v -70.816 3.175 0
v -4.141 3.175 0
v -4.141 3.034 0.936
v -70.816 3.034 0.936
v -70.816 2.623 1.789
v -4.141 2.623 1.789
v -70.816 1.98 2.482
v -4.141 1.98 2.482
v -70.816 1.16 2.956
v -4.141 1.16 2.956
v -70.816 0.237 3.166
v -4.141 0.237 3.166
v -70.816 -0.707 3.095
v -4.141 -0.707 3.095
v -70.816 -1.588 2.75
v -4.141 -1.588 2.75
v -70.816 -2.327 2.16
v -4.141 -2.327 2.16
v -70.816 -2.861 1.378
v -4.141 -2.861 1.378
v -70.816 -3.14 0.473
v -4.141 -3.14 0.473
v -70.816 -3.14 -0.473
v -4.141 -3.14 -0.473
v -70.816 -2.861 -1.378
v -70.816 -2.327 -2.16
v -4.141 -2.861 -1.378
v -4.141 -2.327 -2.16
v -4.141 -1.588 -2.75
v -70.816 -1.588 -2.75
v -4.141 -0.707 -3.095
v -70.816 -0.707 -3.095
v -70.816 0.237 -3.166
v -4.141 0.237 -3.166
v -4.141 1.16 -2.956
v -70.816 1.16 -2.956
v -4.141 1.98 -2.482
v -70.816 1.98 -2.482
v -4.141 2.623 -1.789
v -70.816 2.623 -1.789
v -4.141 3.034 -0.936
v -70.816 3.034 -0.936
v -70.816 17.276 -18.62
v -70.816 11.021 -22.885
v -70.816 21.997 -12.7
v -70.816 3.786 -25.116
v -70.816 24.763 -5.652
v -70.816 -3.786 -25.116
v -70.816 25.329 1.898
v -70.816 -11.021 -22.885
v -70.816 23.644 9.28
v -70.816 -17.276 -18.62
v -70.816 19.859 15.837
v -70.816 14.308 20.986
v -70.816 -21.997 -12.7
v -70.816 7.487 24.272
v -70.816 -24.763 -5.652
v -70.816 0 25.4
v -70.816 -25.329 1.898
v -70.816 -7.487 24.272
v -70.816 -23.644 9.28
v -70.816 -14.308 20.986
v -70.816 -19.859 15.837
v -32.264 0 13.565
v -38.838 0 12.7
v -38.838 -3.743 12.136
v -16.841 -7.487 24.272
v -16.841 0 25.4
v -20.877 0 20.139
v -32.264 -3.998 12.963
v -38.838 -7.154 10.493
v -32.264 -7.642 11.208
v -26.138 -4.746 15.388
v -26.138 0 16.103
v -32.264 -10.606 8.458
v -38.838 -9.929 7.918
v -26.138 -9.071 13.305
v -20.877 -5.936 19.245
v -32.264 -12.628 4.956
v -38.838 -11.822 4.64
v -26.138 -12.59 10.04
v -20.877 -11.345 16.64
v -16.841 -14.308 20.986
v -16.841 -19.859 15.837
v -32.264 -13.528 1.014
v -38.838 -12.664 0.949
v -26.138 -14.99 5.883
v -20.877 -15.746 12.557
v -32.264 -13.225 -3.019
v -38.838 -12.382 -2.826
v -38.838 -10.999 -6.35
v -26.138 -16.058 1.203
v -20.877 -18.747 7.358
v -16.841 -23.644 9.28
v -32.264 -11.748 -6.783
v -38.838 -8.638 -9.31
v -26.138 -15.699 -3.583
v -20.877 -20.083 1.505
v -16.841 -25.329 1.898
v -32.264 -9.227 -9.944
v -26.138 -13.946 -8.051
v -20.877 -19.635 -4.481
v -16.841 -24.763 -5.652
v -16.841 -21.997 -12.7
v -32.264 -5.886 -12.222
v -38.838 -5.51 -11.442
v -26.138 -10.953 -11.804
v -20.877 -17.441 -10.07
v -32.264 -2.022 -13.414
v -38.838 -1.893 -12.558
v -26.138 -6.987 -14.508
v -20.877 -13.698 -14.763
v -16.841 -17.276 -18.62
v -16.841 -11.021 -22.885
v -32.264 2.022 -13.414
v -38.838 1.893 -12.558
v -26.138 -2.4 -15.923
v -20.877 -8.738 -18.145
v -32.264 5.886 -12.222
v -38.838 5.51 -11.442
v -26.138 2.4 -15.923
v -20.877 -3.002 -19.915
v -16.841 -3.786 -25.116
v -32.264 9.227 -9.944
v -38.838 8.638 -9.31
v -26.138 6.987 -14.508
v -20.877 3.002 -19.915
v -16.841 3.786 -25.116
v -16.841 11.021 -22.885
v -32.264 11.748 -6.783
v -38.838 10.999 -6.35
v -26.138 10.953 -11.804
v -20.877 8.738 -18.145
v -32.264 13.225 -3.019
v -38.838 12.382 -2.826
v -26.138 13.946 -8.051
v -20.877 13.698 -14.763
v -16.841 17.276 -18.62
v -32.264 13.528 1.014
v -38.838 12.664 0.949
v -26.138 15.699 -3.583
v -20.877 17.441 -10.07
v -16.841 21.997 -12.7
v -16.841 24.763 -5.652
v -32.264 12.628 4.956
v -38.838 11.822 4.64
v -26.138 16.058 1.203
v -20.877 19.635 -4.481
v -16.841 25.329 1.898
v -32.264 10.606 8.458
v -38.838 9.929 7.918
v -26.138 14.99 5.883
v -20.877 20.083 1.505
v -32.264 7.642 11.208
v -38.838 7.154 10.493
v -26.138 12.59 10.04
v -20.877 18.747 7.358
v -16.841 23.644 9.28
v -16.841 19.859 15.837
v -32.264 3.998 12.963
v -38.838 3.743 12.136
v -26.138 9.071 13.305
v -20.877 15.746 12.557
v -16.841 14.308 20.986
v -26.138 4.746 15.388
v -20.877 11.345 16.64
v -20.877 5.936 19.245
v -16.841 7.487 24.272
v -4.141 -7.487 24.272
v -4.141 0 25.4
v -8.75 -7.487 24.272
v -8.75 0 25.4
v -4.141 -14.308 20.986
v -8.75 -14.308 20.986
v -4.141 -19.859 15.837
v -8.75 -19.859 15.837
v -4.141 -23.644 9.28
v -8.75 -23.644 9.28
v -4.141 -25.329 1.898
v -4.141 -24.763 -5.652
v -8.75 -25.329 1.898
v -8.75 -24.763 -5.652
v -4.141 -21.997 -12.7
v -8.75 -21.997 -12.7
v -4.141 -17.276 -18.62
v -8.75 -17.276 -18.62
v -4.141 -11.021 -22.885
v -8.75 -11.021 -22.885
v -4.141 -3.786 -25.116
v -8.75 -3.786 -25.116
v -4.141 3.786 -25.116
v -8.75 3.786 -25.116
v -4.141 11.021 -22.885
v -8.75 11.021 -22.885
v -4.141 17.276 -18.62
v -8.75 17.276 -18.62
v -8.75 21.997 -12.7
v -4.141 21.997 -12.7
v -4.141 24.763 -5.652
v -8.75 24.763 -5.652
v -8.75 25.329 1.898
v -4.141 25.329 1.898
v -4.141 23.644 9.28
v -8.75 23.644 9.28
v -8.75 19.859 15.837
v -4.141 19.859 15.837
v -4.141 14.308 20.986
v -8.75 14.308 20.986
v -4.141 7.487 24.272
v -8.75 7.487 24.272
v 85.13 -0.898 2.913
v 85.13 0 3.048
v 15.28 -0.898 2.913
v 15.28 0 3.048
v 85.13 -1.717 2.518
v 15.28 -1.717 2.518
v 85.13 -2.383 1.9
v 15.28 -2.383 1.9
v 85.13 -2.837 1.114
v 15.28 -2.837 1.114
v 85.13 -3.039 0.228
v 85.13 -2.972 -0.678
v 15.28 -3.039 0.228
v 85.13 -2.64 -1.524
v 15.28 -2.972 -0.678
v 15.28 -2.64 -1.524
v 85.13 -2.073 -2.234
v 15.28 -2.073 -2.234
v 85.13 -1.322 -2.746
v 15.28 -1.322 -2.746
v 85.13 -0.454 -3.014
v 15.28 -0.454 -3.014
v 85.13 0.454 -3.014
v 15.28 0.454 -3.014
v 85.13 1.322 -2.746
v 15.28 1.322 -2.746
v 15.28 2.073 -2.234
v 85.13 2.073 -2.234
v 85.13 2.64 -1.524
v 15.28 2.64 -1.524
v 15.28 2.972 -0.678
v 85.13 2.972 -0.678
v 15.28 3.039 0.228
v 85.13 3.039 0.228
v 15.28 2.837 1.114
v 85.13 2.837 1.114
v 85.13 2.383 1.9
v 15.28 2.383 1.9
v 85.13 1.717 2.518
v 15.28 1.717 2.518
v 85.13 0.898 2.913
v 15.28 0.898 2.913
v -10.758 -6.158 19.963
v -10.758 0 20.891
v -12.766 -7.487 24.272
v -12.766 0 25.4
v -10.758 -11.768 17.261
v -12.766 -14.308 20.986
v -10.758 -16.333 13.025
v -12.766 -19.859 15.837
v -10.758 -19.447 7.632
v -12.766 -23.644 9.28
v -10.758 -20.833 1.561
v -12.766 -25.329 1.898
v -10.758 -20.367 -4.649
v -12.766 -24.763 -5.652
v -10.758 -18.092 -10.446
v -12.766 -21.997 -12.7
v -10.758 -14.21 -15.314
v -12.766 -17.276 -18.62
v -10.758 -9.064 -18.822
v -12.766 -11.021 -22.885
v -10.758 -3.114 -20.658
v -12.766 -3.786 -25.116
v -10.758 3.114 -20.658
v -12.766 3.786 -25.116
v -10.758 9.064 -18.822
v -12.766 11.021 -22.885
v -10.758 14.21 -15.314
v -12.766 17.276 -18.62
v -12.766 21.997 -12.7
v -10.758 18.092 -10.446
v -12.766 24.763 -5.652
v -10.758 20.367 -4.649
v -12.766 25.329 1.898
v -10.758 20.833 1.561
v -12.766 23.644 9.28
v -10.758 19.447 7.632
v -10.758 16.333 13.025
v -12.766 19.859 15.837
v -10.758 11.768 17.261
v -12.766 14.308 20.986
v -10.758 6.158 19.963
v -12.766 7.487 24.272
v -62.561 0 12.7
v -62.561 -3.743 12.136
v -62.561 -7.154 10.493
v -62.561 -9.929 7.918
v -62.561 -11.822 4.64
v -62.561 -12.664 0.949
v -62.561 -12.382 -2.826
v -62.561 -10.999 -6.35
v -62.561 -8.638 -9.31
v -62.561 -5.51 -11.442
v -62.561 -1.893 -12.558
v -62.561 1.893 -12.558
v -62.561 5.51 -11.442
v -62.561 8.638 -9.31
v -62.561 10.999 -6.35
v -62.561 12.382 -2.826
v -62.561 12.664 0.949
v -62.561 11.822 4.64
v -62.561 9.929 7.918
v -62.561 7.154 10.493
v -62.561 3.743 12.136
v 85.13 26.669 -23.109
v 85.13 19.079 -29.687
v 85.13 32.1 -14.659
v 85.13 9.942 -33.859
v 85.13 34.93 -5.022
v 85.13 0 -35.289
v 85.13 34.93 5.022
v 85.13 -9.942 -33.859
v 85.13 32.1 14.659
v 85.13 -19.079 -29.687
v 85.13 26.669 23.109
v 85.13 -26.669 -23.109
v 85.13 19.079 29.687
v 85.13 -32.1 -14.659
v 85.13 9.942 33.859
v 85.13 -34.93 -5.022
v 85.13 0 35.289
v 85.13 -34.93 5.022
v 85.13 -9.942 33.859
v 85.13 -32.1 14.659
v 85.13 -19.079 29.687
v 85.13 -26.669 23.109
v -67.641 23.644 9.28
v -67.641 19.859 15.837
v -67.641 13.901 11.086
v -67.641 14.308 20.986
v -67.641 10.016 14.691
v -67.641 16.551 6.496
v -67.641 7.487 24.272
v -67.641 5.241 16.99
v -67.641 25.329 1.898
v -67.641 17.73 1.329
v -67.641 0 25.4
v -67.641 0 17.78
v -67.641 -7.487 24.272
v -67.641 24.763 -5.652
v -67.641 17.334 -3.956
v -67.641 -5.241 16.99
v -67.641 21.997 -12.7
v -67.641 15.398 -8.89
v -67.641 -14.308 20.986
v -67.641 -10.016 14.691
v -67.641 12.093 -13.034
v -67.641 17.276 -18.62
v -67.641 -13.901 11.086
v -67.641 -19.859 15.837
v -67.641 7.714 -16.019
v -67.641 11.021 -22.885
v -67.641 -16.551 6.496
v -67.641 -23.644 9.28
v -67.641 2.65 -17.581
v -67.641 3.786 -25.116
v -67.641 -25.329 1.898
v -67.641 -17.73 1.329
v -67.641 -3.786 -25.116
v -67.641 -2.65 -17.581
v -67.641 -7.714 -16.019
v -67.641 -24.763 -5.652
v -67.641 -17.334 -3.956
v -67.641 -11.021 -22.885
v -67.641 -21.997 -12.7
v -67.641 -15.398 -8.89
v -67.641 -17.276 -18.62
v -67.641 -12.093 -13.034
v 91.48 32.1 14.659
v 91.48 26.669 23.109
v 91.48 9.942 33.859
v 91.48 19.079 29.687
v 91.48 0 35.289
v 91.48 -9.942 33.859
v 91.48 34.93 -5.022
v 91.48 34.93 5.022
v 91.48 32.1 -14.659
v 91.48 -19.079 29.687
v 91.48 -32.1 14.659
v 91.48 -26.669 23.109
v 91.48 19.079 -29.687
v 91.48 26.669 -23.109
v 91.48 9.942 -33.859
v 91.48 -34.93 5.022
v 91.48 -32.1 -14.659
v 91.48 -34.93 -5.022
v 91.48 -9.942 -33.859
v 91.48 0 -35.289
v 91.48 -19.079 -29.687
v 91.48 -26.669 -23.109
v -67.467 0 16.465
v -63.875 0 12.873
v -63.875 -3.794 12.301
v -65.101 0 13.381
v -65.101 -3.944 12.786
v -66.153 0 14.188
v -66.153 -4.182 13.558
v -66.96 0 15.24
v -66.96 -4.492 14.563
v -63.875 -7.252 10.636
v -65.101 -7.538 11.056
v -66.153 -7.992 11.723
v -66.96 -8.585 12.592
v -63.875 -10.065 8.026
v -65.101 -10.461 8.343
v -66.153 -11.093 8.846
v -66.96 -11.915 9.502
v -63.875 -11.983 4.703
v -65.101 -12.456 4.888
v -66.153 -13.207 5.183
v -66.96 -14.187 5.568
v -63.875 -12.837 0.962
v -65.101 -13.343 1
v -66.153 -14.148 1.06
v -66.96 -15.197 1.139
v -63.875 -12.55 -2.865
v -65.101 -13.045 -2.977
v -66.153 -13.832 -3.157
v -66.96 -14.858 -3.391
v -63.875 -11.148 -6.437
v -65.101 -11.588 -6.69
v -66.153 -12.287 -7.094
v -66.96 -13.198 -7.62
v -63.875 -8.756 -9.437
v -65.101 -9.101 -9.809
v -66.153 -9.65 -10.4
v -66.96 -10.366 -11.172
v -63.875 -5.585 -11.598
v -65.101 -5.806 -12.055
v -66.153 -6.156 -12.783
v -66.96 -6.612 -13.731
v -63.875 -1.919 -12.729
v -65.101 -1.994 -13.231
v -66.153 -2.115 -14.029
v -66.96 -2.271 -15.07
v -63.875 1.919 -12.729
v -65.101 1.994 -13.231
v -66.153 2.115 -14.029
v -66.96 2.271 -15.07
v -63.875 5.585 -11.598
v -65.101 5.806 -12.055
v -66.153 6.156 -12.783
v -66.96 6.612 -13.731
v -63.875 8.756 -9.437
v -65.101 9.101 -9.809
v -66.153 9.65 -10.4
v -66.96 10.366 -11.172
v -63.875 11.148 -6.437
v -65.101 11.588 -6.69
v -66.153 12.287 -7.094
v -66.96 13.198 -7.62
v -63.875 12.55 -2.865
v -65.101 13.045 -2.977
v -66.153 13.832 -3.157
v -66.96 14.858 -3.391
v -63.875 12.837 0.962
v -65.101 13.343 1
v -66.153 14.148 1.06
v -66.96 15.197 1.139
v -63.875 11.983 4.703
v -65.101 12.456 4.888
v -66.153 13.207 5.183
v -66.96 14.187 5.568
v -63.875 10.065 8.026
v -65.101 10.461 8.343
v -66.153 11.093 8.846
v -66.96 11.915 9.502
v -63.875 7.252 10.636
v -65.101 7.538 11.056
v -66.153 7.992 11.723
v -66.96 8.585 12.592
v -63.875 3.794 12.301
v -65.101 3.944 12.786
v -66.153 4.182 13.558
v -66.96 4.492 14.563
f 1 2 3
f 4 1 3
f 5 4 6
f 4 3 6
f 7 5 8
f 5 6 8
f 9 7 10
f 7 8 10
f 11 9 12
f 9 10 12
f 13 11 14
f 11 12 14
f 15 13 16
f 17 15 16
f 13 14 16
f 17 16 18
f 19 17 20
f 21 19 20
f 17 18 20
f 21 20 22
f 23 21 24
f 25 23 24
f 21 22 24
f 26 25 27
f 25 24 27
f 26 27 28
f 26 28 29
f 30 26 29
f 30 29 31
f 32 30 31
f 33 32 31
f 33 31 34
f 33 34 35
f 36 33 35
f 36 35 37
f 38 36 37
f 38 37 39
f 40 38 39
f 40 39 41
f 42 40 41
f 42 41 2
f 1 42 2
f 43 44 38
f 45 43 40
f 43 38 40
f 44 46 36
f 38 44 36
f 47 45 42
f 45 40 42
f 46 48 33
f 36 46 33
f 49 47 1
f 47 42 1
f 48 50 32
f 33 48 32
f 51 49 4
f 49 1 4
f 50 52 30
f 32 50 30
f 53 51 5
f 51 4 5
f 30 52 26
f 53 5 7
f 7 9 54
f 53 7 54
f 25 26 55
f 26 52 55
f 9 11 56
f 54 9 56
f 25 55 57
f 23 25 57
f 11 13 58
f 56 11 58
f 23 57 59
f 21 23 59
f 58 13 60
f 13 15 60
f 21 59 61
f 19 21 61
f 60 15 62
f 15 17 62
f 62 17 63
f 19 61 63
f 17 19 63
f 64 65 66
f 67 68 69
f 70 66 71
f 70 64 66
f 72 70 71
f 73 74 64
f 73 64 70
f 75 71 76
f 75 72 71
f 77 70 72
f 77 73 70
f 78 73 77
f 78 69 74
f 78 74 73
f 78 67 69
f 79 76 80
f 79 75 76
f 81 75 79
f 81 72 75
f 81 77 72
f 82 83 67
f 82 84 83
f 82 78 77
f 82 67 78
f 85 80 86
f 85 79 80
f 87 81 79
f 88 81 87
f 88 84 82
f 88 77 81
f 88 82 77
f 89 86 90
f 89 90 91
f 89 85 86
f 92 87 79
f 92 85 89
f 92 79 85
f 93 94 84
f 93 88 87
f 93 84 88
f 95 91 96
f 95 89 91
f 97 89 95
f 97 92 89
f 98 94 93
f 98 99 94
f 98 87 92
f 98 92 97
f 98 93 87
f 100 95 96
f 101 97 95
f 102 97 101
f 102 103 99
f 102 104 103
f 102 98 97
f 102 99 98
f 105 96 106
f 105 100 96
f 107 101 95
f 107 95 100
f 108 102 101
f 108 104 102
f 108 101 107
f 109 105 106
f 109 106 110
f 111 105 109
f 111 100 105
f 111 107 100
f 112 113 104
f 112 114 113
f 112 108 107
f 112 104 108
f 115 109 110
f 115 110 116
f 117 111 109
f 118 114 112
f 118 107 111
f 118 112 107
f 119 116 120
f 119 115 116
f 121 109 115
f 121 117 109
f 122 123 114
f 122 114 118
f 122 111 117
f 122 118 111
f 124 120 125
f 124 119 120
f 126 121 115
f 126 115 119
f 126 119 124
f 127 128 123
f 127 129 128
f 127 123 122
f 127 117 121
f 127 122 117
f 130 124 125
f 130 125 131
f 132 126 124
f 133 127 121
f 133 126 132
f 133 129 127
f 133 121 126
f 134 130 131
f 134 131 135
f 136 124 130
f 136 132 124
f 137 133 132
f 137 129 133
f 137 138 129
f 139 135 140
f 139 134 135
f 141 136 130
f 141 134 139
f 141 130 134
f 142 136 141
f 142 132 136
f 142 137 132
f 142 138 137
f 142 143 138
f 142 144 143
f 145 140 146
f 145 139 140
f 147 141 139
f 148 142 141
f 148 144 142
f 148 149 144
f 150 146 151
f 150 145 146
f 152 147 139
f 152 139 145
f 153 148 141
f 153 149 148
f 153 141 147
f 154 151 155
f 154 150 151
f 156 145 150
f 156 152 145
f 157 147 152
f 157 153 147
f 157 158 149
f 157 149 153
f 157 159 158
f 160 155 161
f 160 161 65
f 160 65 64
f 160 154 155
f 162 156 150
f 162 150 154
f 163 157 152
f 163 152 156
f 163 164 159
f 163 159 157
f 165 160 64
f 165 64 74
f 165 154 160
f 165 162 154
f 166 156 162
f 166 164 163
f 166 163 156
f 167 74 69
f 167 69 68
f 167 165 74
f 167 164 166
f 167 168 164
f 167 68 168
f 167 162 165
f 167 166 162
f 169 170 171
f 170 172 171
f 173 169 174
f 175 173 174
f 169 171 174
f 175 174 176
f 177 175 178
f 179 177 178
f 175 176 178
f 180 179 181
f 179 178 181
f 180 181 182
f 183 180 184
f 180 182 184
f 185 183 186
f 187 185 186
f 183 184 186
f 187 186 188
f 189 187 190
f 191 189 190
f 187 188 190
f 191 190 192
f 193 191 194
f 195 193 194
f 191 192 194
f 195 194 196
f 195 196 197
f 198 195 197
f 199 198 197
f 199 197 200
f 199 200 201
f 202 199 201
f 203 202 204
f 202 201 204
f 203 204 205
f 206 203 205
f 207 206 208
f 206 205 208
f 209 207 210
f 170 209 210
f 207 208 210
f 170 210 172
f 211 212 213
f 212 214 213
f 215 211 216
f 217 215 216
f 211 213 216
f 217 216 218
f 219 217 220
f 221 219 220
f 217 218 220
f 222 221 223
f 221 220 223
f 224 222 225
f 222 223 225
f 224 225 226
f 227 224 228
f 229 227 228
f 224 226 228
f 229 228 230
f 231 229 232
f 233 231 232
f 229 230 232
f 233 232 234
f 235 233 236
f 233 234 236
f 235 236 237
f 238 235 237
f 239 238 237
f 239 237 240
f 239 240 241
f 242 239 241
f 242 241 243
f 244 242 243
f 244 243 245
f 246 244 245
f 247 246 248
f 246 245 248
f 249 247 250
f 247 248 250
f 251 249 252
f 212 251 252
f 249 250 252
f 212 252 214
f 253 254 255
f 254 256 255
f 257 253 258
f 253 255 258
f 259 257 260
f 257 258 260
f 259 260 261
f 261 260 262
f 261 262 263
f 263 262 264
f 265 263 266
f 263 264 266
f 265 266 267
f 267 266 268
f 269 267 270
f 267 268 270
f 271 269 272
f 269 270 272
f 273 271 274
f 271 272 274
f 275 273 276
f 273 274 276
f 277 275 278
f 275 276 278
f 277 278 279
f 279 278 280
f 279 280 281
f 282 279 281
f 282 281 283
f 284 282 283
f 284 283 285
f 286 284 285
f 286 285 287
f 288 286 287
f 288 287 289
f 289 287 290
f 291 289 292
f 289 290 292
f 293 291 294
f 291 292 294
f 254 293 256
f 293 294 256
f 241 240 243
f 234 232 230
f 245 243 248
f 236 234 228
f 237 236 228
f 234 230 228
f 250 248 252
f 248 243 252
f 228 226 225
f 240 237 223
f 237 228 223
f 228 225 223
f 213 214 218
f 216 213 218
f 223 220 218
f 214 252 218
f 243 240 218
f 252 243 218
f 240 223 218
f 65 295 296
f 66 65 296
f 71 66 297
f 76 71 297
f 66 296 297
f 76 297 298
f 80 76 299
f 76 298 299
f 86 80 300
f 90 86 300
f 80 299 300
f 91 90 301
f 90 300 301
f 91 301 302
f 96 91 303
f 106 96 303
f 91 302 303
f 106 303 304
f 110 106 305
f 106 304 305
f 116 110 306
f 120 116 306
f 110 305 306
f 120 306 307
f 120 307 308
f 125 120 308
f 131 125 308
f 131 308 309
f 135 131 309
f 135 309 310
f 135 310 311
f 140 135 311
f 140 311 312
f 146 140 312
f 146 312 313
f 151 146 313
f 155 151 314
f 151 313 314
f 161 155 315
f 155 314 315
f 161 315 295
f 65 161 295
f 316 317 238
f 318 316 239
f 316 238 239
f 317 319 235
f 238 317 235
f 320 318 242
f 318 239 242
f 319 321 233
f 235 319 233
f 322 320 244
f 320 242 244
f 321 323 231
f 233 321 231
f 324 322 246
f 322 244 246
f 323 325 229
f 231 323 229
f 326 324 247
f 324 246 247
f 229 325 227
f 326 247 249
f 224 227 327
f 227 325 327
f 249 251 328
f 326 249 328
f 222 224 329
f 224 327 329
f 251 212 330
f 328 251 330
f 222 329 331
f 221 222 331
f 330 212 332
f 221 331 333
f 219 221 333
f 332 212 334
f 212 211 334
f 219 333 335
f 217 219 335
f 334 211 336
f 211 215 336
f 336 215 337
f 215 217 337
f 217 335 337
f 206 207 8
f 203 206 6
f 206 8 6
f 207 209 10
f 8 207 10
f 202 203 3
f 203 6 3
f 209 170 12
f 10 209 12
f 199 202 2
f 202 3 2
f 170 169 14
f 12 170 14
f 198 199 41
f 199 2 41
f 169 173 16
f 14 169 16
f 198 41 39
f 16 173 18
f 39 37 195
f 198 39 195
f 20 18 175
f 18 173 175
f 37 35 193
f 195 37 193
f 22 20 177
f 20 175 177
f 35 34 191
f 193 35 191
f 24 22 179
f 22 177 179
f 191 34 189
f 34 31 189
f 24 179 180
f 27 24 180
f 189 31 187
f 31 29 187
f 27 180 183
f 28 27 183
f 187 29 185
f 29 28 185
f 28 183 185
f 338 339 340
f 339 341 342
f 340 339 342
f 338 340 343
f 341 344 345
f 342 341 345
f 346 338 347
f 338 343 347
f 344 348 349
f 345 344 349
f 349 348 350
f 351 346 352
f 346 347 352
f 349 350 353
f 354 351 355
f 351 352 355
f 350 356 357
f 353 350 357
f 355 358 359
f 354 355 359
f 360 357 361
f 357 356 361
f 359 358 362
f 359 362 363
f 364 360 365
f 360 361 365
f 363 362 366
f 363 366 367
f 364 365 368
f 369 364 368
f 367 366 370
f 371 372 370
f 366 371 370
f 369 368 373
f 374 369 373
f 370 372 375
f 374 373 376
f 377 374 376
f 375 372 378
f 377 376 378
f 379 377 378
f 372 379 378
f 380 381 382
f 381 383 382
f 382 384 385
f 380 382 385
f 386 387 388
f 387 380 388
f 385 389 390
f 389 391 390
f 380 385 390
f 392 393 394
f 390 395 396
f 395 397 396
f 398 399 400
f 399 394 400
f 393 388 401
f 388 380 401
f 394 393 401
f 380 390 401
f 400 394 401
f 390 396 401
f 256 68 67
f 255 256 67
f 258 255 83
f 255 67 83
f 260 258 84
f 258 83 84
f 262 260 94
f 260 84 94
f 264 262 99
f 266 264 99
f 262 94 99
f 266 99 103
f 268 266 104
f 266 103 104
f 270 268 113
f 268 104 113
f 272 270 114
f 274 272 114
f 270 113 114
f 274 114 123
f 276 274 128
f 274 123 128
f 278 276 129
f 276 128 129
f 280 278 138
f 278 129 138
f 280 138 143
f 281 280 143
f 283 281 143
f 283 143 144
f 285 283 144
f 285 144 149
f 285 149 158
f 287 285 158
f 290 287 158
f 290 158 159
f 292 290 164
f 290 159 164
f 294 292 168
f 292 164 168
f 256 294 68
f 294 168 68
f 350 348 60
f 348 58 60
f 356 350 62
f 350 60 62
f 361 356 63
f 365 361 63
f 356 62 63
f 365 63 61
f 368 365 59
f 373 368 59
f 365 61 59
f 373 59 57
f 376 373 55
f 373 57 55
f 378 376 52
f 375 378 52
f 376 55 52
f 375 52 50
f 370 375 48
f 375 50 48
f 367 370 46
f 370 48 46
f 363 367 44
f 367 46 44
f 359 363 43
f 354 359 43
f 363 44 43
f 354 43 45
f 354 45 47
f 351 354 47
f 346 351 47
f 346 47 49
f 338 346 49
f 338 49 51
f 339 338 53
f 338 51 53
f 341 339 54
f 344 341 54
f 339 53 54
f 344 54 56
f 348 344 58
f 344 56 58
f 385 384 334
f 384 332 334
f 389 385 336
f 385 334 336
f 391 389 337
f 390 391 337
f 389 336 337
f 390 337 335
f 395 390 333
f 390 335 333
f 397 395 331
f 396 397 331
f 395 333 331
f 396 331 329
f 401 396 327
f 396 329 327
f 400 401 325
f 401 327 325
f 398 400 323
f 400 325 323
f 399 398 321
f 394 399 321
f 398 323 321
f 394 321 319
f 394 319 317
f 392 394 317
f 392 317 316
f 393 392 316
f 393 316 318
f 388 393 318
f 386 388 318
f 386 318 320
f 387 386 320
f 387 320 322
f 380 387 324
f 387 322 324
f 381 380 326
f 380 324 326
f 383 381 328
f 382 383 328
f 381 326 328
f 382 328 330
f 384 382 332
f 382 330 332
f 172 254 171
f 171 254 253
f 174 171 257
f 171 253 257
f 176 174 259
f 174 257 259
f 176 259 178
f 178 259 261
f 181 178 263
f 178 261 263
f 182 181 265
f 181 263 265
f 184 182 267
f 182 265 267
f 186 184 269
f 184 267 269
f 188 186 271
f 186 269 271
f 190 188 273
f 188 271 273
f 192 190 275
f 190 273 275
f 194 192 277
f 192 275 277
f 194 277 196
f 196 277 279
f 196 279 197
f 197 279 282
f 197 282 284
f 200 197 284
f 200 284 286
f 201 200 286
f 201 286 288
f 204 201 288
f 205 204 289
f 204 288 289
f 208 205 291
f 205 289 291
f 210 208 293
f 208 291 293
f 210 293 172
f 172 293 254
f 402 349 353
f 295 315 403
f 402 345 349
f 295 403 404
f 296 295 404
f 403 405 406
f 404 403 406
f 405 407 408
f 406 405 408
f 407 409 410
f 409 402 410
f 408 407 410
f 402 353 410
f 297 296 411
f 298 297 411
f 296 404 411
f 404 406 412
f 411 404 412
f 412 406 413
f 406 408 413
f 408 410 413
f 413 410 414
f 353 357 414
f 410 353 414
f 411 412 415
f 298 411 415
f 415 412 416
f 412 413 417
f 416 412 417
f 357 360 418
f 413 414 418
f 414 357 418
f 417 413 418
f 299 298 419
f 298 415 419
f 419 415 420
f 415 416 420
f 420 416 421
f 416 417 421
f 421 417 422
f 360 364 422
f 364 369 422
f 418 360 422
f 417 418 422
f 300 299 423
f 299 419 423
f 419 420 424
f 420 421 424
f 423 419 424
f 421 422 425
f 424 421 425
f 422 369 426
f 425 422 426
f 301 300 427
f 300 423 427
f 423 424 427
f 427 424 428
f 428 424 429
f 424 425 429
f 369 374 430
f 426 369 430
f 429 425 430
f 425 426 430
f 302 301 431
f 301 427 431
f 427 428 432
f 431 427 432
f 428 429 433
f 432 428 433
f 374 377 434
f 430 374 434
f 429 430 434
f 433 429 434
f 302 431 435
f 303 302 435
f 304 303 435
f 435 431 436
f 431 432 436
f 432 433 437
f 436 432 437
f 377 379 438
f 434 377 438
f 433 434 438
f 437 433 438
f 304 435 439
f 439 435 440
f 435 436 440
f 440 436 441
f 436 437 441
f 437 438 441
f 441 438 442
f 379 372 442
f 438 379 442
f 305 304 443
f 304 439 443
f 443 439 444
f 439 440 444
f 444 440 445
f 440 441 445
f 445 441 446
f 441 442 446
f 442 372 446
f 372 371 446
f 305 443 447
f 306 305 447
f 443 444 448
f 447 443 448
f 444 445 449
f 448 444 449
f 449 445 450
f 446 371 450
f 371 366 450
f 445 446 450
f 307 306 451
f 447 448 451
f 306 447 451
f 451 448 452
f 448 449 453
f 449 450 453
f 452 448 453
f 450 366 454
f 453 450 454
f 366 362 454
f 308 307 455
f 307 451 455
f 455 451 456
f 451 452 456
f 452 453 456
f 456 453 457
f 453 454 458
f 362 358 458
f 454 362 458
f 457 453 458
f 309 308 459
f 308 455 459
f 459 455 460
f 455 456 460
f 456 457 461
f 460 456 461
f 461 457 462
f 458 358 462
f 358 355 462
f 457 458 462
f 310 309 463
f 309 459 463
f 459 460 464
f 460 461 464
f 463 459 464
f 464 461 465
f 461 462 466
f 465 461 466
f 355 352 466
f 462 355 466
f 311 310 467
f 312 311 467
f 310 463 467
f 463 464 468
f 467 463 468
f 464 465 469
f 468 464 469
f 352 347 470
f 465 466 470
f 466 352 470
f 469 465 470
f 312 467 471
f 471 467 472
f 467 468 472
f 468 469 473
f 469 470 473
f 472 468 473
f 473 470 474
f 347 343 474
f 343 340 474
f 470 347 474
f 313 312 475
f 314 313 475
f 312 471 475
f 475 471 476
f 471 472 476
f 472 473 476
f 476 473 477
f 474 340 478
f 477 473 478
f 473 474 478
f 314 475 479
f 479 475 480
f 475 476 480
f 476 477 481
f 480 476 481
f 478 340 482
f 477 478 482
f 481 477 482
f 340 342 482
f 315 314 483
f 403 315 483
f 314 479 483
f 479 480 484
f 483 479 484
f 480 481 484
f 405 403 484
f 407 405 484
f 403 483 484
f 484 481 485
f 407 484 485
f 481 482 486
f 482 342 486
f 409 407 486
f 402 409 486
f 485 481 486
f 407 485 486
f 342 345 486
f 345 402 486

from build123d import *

# Parameters (mm, degrees)
F3_R     = 3.175
F4_DEPTH = 66.676
F5_R     = 5.08


# Not quite as in the source:
# - a fillet or chamfer that OpenCascade refuses, or shapes differently, is made with other operations: its cross-section is extruded or revolved along the edge and cut away or added


with BuildPart() as f1:
    # F0 (on Front) → F1 (revolve)
    with BuildSketch(Plane.XZ):
        Polygon((-70.8155093496, 25.4), (-70.8155093496, 0), (-4.1405093496, 0), (-4.1405093496, 25.4), (-8.7504833937, 25.4), (-10.7583906502, 20.8912156522), (-12.7662979066, 25.4), (-16.8405093496, 25.4), (-16.8405093496, 12.7), (-67.6405093496, 12.7), (-67.6405093496, 25.4), align=None)
    revolve(axis=Axis((-2.6019513607, 0, 0), (1, 0, 0)))

    # F2: fillet of radius 25.4 on 1 edges, made by hand

    # F2_s1 → F2_t2 (revolve)
    with BuildSketch(Plane.XZ):
        with BuildLine():
            ThreePointArc((-38.8375546057, 12.7), (-26.1375546057, 16.1029547439), (-16.8405093496, 25.4))
            Line((-16.8405093496, 25.4), (-16.4005684445, 25.146))
            ThreePointArc((-16.4005684445, 25.146), (-16.3325093496, 19.05), (-16.3325093496, 12.7))
            Line((-16.3325093496, 12.7), (-16.8405093496, 12.192))
            Line((-16.8405093496, 12.192), (-38.8375546057, 12.192))
            Line((-38.8375546057, 12.192), (-38.8375546057, 12.7))
        make_face()
    revolve(axis=Axis((-16.8405093496, 0, 0), (1, 0, 0)))

    # F3 (on face) → F4 (cut, through all)
    with BuildSketch(Plane.YZ.offset(-4.1405093496)):
        Circle(F3_R)
    extrude(amount=-F4_DEPTH, mode=Mode.SUBTRACT)

    # F5
    f5_edges = [f1.edges().sort_by_distance(p)[0] for p in [
        (-67.640509, 0, -12.7),
    ]]
    fillet(f5_edges, radius=F5_R)


with BuildPart() as f7:
    # F6 (on Front) → F7 (revolve)
    with BuildSketch(Plane.XZ):
        Polygon((15.2796903457, 3.048), (15.2796903457, 0), (91.4796903457, 0), (91.4796903457, 35.2887990795), (85.1296903457, 35.2887990795), (85.1296903457, 3.048), align=None)
    revolve(axis=Axis((53.1151062219, 0, 0), (1, 0, 0)))


solid = Compound([f1.part, f7.part])
